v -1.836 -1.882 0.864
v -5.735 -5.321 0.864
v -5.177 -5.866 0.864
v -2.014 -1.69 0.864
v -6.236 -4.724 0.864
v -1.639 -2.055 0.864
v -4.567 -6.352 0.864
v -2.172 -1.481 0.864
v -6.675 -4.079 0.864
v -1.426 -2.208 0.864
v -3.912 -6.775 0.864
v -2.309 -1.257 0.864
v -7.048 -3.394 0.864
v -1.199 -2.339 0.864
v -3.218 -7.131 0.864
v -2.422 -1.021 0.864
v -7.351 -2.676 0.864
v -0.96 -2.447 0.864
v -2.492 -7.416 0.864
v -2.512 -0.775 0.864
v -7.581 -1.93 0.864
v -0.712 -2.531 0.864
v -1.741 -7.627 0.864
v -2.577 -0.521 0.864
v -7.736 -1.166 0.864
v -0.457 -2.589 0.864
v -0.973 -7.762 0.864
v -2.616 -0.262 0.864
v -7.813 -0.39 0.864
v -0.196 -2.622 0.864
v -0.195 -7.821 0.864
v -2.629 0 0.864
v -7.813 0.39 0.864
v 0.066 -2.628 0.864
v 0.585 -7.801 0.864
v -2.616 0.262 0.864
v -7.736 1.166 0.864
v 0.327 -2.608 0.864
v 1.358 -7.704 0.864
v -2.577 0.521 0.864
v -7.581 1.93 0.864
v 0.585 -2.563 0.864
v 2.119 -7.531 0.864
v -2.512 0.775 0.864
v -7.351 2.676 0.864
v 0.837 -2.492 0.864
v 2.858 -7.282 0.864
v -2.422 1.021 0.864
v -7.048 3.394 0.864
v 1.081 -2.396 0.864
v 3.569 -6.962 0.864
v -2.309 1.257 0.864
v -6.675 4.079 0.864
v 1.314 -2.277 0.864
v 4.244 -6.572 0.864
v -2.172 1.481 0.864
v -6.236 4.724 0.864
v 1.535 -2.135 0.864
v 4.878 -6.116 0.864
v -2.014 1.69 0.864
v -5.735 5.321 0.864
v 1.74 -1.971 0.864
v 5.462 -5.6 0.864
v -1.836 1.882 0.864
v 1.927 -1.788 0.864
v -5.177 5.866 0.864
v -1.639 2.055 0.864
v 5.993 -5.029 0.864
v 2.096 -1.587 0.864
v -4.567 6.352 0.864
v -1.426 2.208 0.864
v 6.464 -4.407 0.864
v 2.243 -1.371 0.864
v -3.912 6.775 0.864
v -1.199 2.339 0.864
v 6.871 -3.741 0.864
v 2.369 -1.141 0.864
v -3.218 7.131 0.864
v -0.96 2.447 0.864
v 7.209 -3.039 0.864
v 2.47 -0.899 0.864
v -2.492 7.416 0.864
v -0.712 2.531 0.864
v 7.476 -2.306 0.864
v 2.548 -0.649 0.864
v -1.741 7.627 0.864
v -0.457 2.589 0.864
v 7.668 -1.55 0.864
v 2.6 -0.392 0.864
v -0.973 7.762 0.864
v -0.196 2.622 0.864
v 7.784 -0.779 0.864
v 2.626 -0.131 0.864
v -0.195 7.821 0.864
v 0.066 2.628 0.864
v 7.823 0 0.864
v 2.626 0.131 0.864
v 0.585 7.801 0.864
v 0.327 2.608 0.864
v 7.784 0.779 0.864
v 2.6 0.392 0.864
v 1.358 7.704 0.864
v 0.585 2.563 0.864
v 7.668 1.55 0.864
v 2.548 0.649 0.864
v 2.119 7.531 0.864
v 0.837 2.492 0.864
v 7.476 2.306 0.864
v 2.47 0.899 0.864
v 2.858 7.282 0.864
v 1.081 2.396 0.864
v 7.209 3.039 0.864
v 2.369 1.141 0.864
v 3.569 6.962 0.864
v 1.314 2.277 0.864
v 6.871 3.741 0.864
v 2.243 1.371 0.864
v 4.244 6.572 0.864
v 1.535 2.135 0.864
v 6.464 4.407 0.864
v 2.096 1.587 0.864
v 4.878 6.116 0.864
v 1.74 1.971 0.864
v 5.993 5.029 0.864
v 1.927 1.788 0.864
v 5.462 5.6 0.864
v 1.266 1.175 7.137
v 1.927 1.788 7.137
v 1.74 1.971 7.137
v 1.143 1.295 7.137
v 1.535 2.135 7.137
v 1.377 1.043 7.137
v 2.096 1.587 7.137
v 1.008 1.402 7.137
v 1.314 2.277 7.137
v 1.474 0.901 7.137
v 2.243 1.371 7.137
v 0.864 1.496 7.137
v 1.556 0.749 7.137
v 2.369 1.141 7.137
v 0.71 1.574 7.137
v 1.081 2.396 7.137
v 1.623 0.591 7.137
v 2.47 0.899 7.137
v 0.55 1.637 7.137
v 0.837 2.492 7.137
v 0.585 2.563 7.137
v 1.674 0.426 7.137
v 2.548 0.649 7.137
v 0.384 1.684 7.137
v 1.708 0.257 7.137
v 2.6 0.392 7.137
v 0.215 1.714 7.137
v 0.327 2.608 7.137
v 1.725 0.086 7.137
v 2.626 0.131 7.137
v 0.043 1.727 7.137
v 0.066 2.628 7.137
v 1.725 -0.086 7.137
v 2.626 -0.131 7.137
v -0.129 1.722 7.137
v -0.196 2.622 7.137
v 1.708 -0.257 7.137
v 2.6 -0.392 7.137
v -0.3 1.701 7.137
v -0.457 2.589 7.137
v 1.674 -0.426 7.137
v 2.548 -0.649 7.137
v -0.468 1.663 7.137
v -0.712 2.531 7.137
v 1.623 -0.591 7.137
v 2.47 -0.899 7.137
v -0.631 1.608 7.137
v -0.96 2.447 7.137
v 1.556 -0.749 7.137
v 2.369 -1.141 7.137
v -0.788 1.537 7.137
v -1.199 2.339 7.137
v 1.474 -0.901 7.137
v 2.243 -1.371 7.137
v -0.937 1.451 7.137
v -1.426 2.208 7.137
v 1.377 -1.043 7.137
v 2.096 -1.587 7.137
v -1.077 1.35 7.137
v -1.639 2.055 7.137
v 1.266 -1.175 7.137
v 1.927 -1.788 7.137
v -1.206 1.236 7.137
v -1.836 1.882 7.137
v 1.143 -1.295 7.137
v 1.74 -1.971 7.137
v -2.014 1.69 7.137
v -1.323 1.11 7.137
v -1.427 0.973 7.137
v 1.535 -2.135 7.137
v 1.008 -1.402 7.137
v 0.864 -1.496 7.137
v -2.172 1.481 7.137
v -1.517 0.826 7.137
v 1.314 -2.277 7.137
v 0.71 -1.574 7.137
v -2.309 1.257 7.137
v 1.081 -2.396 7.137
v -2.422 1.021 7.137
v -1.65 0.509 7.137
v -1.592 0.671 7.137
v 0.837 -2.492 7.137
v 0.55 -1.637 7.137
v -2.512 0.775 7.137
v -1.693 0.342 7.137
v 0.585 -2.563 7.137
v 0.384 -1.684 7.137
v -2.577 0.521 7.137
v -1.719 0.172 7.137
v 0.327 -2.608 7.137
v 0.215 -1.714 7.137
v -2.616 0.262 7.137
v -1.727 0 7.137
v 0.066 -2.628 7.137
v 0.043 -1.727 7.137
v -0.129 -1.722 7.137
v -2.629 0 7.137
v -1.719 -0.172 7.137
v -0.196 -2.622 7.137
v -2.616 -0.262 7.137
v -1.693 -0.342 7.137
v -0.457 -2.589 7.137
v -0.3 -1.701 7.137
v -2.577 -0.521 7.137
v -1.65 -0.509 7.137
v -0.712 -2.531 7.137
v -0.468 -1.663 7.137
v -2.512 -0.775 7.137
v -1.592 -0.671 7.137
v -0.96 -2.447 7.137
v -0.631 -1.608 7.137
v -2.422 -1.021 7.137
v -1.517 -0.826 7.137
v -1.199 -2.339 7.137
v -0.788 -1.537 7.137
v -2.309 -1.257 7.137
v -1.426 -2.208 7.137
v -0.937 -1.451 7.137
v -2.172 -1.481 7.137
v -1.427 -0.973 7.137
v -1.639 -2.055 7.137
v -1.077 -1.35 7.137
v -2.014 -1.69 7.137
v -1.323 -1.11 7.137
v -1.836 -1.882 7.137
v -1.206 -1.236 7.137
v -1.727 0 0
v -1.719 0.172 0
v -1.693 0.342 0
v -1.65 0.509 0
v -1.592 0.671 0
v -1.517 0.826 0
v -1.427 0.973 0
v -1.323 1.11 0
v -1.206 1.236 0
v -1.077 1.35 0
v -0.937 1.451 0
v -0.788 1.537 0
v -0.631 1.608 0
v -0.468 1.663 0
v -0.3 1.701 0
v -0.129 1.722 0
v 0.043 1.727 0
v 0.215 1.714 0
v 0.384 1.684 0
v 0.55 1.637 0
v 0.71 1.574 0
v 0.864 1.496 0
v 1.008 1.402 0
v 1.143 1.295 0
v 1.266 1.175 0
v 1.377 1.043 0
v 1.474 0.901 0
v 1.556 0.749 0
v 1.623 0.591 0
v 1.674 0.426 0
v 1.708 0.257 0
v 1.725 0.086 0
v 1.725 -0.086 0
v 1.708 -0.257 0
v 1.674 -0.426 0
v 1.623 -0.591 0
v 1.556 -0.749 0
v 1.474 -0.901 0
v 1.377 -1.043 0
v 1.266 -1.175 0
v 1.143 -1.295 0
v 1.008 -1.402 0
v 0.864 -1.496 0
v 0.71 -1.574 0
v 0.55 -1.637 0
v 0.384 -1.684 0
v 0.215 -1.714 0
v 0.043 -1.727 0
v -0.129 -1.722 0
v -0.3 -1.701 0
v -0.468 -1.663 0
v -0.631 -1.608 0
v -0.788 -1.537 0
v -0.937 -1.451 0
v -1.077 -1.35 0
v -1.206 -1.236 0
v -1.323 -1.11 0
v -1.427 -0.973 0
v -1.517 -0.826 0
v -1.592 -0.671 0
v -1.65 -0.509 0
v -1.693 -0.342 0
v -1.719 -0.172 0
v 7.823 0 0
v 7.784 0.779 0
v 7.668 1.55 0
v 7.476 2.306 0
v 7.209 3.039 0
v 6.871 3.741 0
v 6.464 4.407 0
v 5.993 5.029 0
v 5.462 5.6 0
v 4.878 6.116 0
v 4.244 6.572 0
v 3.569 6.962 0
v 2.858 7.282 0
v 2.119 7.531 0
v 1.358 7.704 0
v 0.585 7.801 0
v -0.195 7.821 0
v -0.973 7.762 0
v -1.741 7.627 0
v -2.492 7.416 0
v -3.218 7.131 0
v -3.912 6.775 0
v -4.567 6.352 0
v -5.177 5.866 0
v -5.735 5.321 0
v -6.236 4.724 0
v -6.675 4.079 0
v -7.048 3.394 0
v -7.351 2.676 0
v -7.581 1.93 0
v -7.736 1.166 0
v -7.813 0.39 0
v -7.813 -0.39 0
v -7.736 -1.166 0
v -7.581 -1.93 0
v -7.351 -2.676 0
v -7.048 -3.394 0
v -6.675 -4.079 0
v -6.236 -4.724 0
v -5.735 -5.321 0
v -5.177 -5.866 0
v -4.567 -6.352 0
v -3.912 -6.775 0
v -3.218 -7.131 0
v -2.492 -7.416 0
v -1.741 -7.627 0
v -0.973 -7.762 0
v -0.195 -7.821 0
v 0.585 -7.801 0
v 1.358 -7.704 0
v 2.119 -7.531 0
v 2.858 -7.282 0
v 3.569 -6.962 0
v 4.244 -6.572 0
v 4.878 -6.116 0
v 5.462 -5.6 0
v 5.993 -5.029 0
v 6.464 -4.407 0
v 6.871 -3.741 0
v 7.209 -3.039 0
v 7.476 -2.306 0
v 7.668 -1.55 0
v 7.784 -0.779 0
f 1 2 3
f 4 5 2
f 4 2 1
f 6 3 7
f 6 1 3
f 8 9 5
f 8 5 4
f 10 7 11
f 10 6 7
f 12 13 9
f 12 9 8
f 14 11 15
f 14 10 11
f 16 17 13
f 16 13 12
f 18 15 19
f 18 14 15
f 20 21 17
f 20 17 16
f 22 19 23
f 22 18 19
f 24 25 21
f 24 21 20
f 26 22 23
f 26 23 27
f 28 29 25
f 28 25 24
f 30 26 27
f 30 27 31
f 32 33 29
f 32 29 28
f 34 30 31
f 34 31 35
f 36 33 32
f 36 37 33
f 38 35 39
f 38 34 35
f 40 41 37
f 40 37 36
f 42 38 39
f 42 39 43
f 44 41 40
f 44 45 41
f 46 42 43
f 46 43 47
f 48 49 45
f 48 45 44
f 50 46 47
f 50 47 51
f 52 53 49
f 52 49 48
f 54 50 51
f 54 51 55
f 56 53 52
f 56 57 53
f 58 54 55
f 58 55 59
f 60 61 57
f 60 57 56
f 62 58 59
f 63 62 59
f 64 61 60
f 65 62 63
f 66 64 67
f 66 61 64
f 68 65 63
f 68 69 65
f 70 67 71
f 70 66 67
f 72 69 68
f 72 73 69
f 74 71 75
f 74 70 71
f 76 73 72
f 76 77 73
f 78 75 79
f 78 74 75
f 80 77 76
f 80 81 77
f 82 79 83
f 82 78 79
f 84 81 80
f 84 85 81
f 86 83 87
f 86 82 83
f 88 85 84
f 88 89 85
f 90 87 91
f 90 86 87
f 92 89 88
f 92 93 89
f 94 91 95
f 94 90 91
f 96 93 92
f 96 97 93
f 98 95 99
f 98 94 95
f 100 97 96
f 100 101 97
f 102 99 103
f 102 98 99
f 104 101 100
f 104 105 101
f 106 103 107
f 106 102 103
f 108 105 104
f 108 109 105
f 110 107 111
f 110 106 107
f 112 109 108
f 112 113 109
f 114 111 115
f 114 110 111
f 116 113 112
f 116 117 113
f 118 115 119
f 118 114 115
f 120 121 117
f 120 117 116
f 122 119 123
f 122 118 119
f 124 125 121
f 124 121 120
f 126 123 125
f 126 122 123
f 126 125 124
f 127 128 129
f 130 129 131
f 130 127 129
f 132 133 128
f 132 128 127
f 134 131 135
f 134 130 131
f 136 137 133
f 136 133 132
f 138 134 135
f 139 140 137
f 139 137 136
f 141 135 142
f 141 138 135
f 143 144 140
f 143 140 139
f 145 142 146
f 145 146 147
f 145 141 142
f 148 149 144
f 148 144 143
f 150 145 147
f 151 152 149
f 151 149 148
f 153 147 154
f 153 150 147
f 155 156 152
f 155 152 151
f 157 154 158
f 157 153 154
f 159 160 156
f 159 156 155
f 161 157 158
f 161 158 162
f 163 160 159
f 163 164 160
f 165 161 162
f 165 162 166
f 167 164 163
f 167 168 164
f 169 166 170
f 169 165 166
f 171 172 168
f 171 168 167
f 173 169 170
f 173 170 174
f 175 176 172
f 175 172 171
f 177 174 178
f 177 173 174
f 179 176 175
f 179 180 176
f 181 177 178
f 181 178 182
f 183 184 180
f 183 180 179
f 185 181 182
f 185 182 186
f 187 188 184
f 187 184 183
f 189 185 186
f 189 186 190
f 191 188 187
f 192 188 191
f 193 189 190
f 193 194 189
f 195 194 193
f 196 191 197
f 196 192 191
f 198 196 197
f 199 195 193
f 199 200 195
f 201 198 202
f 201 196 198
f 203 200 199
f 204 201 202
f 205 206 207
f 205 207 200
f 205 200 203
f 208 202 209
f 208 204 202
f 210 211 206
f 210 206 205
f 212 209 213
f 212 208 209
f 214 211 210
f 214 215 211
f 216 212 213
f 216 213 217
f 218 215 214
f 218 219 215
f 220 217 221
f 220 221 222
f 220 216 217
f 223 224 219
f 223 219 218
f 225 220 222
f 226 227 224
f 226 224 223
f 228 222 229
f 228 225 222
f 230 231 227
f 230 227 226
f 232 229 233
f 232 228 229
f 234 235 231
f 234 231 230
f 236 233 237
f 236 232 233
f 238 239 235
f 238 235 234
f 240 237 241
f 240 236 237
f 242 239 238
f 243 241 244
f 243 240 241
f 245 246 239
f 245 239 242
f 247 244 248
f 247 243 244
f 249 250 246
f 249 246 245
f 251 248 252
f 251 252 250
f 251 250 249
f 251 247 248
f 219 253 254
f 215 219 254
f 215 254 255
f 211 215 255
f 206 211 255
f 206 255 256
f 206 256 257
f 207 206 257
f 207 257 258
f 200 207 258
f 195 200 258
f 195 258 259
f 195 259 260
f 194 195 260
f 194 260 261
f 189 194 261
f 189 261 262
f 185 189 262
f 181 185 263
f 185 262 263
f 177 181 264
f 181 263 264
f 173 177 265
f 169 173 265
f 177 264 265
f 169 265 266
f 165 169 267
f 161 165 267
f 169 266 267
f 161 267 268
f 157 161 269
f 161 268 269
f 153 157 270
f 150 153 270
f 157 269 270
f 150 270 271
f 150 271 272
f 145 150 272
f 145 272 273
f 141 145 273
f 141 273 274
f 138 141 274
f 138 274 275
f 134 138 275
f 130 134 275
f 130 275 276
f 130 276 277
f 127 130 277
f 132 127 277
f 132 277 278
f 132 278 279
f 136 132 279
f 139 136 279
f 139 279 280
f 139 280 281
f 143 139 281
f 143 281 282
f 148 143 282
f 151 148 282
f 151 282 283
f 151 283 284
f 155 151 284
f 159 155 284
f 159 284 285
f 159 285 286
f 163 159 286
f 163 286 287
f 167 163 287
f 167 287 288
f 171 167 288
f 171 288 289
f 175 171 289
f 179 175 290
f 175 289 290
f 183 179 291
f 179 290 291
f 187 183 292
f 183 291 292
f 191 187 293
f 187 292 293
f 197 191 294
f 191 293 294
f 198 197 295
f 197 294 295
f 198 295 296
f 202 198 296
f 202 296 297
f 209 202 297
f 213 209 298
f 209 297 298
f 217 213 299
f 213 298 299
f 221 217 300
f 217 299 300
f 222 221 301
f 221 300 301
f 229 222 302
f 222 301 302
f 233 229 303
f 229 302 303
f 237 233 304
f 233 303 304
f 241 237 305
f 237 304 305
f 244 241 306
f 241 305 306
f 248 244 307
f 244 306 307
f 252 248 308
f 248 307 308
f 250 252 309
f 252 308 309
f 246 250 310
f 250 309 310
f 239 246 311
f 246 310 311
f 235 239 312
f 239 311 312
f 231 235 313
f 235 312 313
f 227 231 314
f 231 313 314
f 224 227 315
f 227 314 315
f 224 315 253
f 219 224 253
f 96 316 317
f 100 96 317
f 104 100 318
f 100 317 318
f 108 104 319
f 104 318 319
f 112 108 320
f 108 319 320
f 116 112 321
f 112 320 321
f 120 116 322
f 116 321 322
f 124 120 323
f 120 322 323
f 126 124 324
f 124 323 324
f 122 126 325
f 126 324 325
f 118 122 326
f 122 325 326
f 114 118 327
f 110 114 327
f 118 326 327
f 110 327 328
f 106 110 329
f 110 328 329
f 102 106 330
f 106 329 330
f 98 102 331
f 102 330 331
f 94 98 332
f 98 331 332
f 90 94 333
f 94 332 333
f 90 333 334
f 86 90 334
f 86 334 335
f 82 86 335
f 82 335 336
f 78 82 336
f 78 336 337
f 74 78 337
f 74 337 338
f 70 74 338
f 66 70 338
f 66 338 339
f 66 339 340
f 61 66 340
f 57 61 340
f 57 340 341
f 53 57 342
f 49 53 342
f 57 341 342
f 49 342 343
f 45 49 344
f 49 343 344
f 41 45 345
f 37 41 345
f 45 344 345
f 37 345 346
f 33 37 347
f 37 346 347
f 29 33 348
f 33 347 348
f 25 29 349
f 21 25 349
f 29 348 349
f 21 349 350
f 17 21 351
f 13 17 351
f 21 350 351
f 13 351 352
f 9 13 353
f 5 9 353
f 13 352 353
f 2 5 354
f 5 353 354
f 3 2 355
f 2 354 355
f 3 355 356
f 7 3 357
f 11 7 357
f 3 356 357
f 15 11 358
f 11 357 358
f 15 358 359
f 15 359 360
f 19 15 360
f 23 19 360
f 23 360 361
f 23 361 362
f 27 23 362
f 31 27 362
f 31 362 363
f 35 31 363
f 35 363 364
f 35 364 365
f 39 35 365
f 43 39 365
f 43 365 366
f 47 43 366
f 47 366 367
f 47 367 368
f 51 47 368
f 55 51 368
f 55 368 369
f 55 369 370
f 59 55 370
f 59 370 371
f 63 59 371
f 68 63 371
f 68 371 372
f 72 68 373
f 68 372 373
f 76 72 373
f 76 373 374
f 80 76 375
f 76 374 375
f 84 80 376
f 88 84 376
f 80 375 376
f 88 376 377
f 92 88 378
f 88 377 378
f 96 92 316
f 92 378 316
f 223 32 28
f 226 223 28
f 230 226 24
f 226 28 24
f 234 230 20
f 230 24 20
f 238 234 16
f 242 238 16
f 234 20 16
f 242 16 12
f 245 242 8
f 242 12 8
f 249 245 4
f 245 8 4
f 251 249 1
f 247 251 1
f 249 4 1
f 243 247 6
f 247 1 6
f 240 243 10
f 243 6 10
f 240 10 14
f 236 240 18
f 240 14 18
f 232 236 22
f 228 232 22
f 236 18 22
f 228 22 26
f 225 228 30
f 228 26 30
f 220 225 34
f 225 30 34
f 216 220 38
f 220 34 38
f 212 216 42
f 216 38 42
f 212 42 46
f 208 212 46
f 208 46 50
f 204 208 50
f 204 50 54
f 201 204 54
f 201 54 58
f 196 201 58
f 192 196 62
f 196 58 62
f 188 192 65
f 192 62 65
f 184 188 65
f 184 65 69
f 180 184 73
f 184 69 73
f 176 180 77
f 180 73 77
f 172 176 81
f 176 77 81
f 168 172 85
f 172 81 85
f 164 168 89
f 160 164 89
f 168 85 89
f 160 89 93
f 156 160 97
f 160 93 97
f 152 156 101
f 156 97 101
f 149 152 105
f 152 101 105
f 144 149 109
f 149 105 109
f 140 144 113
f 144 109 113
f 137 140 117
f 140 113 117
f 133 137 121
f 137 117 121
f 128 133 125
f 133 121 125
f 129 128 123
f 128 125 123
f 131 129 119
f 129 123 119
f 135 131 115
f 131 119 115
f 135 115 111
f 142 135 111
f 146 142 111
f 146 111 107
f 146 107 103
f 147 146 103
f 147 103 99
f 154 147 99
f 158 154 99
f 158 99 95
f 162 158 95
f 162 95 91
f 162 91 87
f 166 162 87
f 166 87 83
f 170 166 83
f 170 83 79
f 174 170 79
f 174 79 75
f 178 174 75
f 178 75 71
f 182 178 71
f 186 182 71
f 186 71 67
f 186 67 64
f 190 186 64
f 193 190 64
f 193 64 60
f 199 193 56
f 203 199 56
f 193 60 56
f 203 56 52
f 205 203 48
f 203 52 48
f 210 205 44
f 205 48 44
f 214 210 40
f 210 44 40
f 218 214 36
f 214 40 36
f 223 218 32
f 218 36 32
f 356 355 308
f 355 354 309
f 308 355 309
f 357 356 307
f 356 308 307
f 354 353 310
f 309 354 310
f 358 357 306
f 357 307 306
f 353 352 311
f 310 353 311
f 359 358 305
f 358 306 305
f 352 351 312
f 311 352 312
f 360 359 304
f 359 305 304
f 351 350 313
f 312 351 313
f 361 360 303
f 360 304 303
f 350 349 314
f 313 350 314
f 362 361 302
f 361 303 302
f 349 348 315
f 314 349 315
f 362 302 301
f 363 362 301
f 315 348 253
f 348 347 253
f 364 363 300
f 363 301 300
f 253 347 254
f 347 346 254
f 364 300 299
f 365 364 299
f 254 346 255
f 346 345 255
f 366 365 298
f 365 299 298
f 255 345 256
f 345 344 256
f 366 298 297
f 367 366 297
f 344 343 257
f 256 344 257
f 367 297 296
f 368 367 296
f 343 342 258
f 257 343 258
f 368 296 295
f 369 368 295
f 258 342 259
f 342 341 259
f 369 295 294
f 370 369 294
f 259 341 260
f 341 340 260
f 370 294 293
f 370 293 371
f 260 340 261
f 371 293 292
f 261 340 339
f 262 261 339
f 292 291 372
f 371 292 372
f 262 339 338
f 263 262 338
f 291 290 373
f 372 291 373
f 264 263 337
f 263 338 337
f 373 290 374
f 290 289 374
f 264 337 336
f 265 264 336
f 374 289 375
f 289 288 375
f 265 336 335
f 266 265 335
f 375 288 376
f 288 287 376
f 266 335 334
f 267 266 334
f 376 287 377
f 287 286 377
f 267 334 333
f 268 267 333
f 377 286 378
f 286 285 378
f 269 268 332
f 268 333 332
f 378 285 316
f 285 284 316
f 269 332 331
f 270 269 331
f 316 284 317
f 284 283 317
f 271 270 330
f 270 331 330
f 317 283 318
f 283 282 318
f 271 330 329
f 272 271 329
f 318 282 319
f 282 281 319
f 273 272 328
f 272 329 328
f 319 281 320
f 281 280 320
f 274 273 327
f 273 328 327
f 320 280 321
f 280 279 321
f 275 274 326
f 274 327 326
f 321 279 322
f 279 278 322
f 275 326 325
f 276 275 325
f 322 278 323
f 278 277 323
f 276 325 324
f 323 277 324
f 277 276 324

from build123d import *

# Parameters (mm, degrees)
SKETCH1_R                 = 7.8232
BOSS_EXTRUDE1_DEPTH       = 0.8636
SKETCH2_R                 = 2.6289
BOSS_EXTRUDE2_DEPTH       = 6.2738
TAP_DRILL_FOR_8_32_TAP1_D = 3.4544


with BuildPart() as part:
    # Sketch1 → Boss-Extrude1 (new body)
    with BuildSketch(Plane.XY):
        Circle(SKETCH1_R)
    extrude(amount=BOSS_EXTRUDE1_DEPTH)

    # Sketch2 → Boss-Extrude2 (add)
    with BuildSketch(Plane.XY.offset(0.8636)):
        with Locations(Location((0, 0, 0), (0, 0, 180))):
            Circle(SKETCH2_R)
    extrude(amount=BOSS_EXTRUDE2_DEPTH)

    # Tap Drill for #8-32 Tap1 (through all)
    with Locations(Plane.XY.offset(7.1374)):
        with Locations((0, 0)):
            Hole(TAP_DRILL_FOR_8_32_TAP1_D / 2)


solid = part.part
